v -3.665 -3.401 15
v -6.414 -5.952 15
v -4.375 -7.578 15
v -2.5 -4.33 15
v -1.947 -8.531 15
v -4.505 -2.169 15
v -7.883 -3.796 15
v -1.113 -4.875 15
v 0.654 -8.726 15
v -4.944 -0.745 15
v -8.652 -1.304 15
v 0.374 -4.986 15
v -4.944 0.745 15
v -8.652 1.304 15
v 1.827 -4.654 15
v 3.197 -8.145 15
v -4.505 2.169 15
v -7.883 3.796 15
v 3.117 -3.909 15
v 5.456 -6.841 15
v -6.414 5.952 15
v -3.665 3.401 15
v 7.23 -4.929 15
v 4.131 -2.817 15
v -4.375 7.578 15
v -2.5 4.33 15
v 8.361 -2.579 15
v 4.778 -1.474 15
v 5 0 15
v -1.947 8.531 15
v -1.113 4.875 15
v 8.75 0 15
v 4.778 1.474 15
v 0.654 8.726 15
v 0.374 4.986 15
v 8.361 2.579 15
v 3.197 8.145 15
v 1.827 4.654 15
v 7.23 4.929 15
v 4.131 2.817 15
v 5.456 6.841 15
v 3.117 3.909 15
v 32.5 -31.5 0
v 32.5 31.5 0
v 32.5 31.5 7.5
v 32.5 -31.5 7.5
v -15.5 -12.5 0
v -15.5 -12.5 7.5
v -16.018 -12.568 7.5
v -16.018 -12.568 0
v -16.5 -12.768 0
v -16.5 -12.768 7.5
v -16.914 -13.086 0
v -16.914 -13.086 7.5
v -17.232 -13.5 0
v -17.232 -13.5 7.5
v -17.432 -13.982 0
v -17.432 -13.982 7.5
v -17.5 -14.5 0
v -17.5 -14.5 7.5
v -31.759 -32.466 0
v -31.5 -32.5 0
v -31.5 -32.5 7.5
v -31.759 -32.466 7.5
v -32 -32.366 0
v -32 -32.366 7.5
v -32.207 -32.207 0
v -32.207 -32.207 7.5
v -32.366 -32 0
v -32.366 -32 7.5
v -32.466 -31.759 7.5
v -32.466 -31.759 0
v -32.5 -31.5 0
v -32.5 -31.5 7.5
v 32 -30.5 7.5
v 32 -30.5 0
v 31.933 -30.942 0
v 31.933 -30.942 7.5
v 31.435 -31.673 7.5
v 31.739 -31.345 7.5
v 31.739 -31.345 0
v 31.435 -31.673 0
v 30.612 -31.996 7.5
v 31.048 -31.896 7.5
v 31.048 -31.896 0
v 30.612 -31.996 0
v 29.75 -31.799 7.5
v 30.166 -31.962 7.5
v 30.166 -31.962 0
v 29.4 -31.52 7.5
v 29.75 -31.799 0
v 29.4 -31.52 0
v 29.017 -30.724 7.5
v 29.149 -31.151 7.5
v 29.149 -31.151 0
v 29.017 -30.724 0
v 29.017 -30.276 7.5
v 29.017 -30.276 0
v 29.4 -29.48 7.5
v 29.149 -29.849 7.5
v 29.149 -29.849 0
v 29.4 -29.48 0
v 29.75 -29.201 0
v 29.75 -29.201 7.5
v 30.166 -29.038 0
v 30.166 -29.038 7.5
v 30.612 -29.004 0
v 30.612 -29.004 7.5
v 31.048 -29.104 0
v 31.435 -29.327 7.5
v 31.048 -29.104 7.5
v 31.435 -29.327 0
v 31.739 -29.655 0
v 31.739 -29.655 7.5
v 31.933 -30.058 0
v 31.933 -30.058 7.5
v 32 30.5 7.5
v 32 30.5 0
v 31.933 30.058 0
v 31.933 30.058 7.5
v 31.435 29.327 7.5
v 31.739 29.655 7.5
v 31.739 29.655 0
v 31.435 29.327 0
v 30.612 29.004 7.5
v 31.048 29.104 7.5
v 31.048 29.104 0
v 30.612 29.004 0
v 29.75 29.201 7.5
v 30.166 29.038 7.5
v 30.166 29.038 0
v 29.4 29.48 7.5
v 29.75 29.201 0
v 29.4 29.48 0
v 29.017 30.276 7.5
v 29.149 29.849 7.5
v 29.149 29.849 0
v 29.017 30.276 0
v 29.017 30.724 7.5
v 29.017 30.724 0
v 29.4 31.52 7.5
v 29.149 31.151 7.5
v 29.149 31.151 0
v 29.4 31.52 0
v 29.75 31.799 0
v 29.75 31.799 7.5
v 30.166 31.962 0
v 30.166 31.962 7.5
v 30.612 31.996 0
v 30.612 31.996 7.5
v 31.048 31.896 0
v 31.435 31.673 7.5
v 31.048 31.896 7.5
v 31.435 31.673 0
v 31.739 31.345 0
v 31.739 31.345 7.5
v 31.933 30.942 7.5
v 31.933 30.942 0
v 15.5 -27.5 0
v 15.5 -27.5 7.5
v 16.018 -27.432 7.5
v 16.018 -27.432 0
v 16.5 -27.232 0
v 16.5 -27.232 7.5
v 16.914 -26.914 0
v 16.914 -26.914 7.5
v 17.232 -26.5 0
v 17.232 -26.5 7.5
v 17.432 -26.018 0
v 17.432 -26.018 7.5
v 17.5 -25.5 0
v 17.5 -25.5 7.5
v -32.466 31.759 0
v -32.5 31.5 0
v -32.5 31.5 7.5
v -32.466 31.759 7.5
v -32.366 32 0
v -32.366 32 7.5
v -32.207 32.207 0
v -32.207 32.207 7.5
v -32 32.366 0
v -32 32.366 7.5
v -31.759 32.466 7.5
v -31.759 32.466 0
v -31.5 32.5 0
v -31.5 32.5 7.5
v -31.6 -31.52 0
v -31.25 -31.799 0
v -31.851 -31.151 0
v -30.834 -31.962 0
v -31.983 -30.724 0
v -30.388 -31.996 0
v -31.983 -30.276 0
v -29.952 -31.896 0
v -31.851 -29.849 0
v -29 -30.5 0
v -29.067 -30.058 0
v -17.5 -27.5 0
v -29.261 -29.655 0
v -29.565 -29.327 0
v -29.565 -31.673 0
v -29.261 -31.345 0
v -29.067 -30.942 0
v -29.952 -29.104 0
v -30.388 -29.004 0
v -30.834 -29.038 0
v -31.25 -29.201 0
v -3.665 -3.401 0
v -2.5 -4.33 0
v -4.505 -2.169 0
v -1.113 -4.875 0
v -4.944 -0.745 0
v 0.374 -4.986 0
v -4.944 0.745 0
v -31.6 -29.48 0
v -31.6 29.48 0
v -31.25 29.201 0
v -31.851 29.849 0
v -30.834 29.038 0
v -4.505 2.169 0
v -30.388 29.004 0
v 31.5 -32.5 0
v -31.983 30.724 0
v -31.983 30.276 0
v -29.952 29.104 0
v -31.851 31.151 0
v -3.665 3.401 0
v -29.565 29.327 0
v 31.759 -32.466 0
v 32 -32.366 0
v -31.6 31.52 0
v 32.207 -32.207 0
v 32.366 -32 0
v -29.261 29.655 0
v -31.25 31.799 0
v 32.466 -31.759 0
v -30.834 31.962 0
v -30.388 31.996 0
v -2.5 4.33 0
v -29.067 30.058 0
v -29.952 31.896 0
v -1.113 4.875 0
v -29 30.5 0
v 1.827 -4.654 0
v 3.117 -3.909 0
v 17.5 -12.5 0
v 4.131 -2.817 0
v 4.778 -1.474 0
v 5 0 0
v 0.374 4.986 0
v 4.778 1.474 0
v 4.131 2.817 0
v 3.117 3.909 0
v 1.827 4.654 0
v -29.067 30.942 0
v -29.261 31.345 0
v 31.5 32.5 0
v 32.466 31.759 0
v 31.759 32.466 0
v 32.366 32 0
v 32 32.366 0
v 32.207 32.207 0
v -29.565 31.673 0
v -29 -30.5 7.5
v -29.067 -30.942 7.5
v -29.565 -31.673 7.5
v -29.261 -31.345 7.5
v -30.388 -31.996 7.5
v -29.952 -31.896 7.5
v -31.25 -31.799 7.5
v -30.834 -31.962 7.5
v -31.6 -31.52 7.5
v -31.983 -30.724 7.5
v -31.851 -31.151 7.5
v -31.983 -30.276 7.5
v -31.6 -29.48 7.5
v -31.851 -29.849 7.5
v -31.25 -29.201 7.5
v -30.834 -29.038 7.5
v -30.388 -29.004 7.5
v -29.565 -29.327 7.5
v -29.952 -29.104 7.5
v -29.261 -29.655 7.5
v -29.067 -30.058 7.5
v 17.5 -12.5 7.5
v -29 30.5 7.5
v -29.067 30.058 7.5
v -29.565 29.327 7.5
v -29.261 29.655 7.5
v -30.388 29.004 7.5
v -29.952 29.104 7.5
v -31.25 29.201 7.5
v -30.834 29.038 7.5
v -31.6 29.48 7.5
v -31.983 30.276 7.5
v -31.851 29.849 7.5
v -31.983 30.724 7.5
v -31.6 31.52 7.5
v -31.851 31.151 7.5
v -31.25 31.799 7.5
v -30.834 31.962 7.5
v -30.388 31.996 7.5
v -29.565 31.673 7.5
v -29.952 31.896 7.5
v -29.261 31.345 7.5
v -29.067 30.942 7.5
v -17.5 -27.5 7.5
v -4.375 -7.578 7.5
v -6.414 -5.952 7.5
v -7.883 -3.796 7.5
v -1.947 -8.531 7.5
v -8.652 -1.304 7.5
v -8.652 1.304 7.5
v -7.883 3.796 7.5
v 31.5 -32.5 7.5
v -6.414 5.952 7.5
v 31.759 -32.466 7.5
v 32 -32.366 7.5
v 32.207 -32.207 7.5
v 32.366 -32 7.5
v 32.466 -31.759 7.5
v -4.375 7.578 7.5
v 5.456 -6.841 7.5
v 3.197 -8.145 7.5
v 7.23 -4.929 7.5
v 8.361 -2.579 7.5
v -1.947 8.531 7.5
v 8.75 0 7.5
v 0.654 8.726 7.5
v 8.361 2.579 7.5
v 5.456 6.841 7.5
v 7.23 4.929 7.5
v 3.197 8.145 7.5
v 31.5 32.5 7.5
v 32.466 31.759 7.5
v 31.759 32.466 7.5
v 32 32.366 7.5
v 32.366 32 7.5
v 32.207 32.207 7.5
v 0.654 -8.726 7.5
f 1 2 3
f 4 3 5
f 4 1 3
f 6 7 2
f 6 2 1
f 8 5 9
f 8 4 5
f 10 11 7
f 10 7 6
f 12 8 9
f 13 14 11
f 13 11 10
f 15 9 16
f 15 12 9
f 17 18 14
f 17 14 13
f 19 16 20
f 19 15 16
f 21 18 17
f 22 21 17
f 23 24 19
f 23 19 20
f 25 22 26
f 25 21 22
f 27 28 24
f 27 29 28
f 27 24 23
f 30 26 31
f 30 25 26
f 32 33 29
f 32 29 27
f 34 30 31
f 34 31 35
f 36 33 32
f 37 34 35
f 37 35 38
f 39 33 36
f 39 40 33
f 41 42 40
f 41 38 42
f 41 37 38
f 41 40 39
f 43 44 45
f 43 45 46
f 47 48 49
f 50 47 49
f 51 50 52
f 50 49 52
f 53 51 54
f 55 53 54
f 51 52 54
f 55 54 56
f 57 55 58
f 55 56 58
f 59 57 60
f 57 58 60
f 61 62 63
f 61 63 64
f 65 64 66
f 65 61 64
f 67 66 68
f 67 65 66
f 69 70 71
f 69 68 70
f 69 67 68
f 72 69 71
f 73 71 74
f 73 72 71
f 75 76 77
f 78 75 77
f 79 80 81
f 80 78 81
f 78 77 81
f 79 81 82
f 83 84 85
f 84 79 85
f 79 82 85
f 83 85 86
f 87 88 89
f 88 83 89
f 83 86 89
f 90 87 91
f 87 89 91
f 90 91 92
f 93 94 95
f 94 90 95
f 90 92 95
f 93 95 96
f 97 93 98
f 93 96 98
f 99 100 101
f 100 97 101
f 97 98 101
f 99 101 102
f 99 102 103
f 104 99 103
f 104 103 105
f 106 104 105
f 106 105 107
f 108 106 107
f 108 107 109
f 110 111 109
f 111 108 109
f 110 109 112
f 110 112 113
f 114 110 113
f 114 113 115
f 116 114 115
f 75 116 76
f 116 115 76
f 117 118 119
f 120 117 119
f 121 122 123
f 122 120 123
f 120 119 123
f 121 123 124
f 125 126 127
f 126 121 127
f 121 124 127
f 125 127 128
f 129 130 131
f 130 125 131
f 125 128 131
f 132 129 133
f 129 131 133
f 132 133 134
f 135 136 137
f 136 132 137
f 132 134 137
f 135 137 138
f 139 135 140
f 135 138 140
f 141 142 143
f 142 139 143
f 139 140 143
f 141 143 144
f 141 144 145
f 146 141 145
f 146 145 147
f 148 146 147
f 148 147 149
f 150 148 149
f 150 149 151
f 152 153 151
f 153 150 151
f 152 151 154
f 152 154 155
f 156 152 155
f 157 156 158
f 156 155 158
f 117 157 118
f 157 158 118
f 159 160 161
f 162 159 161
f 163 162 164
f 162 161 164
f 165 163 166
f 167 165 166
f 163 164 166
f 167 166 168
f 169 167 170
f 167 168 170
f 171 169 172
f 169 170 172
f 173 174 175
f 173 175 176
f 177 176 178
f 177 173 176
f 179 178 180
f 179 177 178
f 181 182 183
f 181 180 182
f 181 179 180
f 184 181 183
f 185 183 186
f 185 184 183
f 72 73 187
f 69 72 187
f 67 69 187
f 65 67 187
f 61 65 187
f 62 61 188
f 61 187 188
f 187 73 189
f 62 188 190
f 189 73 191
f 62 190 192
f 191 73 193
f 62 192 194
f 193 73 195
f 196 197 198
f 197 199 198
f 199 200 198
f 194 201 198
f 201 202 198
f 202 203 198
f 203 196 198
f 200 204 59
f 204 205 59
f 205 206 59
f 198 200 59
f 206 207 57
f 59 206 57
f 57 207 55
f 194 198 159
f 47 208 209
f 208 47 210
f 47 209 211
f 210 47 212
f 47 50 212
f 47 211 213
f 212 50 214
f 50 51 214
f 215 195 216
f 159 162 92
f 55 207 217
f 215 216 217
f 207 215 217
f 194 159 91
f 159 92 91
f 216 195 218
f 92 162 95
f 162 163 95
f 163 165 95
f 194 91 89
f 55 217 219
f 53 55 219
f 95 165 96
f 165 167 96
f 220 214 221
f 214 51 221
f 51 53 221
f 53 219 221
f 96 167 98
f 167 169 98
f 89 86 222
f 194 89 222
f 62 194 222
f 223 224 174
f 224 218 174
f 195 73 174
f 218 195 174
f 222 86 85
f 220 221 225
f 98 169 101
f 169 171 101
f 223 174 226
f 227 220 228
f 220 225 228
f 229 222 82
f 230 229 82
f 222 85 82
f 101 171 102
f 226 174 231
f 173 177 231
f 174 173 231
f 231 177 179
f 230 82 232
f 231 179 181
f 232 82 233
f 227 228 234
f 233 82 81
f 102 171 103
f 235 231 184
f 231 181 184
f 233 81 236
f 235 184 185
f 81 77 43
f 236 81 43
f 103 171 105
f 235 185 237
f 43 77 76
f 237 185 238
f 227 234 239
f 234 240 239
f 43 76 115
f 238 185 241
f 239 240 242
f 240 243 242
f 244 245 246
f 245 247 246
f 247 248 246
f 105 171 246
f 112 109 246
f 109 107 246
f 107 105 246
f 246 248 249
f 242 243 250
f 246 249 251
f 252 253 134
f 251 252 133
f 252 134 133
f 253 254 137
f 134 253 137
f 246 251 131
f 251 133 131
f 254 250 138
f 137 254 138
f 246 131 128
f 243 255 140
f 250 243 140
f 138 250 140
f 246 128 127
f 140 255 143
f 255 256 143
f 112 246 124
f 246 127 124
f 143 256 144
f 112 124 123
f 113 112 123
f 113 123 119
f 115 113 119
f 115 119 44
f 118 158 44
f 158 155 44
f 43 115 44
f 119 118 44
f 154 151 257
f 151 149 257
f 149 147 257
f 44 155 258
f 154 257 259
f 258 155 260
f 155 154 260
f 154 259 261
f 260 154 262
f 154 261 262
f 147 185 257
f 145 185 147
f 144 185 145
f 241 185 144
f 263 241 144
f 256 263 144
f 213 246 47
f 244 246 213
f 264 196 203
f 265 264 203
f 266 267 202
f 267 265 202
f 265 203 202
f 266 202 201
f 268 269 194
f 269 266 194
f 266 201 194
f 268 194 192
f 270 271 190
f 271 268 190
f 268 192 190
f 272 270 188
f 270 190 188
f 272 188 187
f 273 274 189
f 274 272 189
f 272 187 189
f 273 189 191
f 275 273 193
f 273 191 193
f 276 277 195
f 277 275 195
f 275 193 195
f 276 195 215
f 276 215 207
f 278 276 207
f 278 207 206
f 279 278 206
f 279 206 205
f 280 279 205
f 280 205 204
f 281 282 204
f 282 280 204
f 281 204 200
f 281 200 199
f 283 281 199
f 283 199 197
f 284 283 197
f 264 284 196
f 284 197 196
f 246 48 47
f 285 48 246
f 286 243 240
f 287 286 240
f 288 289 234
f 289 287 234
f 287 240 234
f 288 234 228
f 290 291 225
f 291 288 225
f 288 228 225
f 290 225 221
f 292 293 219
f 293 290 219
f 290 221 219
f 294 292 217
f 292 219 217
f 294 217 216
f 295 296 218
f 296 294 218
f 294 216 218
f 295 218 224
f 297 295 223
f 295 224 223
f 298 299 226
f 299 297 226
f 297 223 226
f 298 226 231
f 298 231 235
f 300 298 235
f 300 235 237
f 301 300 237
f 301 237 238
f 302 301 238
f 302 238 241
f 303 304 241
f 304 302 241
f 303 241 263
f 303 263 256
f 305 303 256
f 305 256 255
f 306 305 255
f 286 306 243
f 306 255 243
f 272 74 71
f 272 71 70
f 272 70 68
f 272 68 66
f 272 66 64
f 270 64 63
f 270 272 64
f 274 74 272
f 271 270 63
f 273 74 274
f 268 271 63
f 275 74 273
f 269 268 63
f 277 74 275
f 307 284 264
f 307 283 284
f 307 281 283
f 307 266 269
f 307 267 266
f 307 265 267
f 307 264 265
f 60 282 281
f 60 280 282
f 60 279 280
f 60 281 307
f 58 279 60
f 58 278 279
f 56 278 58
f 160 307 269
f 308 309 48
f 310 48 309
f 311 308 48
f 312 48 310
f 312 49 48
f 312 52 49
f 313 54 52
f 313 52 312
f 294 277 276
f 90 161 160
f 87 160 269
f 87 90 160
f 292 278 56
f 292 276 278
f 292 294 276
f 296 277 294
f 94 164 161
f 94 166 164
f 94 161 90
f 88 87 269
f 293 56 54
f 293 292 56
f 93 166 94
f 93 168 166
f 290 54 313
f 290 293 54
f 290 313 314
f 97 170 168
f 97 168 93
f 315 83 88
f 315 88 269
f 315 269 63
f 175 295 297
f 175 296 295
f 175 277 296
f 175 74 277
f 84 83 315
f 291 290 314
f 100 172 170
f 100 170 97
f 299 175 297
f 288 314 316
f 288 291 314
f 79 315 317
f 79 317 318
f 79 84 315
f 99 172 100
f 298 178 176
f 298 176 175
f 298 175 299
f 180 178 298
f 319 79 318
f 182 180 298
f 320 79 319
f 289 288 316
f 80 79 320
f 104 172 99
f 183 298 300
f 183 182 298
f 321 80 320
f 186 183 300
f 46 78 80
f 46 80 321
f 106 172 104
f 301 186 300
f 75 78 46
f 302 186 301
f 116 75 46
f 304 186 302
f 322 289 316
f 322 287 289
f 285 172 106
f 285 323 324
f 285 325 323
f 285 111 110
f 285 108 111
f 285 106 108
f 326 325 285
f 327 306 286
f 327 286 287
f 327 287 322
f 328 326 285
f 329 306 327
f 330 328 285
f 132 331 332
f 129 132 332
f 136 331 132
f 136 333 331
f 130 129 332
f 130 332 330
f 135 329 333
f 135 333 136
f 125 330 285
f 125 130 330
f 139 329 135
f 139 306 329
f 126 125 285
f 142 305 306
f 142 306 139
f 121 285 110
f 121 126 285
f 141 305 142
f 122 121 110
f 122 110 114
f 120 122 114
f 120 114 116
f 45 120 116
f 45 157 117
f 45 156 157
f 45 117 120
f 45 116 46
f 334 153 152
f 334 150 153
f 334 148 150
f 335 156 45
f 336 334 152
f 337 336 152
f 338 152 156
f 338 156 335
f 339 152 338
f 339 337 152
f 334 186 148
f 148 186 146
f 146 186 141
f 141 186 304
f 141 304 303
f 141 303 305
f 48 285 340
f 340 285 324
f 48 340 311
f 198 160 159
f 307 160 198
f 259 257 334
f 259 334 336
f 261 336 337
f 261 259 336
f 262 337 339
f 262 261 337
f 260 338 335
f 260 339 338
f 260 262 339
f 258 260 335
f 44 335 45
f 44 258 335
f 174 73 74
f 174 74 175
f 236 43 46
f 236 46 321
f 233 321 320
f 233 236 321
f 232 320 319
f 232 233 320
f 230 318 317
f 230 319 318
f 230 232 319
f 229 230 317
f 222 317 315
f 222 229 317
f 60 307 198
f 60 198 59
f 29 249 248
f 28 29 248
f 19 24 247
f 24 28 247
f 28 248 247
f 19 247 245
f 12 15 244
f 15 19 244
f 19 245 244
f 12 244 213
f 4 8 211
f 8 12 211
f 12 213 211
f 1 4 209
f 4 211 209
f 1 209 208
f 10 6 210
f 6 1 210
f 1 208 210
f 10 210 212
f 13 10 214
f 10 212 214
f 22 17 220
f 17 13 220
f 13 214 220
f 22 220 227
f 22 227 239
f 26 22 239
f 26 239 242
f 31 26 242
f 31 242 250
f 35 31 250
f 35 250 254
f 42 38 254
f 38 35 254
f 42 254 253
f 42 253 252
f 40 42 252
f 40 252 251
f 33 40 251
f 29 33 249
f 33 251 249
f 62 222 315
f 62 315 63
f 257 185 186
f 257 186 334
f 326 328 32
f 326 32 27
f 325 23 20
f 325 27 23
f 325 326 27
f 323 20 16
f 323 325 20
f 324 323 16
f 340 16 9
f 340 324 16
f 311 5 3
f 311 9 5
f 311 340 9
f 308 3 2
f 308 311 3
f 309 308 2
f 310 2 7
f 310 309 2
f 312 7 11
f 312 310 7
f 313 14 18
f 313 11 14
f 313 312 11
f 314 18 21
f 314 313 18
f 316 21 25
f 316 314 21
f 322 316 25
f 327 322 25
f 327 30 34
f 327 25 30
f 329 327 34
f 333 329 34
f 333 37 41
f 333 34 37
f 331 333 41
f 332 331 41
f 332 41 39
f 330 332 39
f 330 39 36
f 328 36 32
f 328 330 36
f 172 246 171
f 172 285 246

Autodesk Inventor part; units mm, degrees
ref_plane "YZ Plane" through (0, 0, 0) normal (1, 0, 0) x (0, 1, 0)
ref_plane "XZ Plane" through (0, 0, 0) normal (0, 1, 0) x (-1, 0, 0)
ref_plane "XY Plane" through (0, 0, 0) normal (0, 0, 1) x (1, 0, 0)
sketch "Sketch1" plane through (0, 0, 0) normal (0, 0, 1) x (1, 0, 0)
  line L0 (-30.5, -30.5) -> (30.5, -30.5) construction
  line L1 (30.5, -30.5) -> (30.5, 30.5) construction
  line L2 (30.5, 30.5) -> (-30.5, 30.5) construction
  line L3 (-30.5, 30.5) -> (-30.5, -30.5) construction
  line L4 (-30.5, -30.5) -> (30.5, 30.5) construction
  line L5 (30.5, -30.5) -> (-30.5, 30.5) construction
  circle A0 centre (0, 0) radius 5
  circle A1 centre (-30.5, 30.5) radius 1.5
  circle A2 centre (30.5, 30.5) radius 1.5
  circle A3 centre (-30.5, -30.5) radius 1.5
  circle A4 centre (30.5, -30.5) radius 1.5
  line L6 (31.5, -32.5) -> (-31.5, -32.5)
  line L7 (-32.5, -31.5) -> (-32.5, 31.5)
  line L8 (-31.5, 32.5) -> (31.5, 32.5)
  line L9 (32.5, 31.5) -> (32.5, -31.5)
  line L10 (32.5, -32.5) -> (-32.5, 32.5) construction
  line L11 (-32.5, -32.5) -> (32.5, 32.5) construction
  arc A5 (-31.5, 32.5) -> (-32.5, 31.5) centre (-31.5, 31.5) ccw
  arc A6 (32.5, 31.5) -> (31.5, 32.5) centre (31.5, 31.5) ccw
  arc A7 (31.5, -32.5) -> (32.5, -31.5) centre (31.5, -31.5) ccw
  arc A8 (-32.5, -31.5) -> (-31.5, -32.5) centre (-31.5, -31.5) ccw
  circle A9 centre (0, 0) radius 8.75
  dimension "d0" = 61
  dimension "d1" = 61
  dimension "d2" = 10
  dimension "d3" = 3
  dimension "d4" = 3
  dimension "d5" = 3
  dimension "d6" = 3
  dimension "d7" = 0
  dimension "d8" = 61
  dimension "d9" = 65
  dimension "d10" = 65
  dimension "d11" = 1
  dimension "d12" = 17.5
extrude "Extrusion1" add sketch "Sketch1" along normal blind 7.5 contours L6 A8 L7 A5 L8 A6 L9 A7
extrude "Extrusion2" add sketch "Sketch1" along normal blind 15 contours A9
sketch "Sketch2" plane through (0, 0, 7.5) normal (0, 0, 1) x (1, 0, 0)
  line L0 (-15.5, -12.5) -> (17.5, -12.5)
  line L1 (17.5, -12.5) -> (17.5, -25.5)
  line L2 (15.5, -27.5) -> (-17.5, -27.5)
  line L3 (-17.5, -27.5) -> (-17.5, -14.5)
  line L4 (-32.5, 31.5) -> (-32.5, -31.5) projected
  line L5 (32.5, -31.5) -> (32.5, 31.5) projected
  line L6 (-31.5, -32.5) -> (31.5, -32.5) projected
  arc A0 (-15.5, -12.5) -> (-17.5, -14.5) centre (-15.5, -14.5) ccw
  arc A1 (15.5, -27.5) -> (17.5, -25.5) centre (15.5, -25.5) ccw
  point P0 (0, 0)
  dimension "d17" = 15
  dimension "d18" = 15
  dimension "d19" = 5
  dimension "d20" = 15
  dimension "d21" = 2
extrude "Extrusion3" cut sketch "Sketch2" against normal up to surface (7.5 mm away)
properties part number "top"
